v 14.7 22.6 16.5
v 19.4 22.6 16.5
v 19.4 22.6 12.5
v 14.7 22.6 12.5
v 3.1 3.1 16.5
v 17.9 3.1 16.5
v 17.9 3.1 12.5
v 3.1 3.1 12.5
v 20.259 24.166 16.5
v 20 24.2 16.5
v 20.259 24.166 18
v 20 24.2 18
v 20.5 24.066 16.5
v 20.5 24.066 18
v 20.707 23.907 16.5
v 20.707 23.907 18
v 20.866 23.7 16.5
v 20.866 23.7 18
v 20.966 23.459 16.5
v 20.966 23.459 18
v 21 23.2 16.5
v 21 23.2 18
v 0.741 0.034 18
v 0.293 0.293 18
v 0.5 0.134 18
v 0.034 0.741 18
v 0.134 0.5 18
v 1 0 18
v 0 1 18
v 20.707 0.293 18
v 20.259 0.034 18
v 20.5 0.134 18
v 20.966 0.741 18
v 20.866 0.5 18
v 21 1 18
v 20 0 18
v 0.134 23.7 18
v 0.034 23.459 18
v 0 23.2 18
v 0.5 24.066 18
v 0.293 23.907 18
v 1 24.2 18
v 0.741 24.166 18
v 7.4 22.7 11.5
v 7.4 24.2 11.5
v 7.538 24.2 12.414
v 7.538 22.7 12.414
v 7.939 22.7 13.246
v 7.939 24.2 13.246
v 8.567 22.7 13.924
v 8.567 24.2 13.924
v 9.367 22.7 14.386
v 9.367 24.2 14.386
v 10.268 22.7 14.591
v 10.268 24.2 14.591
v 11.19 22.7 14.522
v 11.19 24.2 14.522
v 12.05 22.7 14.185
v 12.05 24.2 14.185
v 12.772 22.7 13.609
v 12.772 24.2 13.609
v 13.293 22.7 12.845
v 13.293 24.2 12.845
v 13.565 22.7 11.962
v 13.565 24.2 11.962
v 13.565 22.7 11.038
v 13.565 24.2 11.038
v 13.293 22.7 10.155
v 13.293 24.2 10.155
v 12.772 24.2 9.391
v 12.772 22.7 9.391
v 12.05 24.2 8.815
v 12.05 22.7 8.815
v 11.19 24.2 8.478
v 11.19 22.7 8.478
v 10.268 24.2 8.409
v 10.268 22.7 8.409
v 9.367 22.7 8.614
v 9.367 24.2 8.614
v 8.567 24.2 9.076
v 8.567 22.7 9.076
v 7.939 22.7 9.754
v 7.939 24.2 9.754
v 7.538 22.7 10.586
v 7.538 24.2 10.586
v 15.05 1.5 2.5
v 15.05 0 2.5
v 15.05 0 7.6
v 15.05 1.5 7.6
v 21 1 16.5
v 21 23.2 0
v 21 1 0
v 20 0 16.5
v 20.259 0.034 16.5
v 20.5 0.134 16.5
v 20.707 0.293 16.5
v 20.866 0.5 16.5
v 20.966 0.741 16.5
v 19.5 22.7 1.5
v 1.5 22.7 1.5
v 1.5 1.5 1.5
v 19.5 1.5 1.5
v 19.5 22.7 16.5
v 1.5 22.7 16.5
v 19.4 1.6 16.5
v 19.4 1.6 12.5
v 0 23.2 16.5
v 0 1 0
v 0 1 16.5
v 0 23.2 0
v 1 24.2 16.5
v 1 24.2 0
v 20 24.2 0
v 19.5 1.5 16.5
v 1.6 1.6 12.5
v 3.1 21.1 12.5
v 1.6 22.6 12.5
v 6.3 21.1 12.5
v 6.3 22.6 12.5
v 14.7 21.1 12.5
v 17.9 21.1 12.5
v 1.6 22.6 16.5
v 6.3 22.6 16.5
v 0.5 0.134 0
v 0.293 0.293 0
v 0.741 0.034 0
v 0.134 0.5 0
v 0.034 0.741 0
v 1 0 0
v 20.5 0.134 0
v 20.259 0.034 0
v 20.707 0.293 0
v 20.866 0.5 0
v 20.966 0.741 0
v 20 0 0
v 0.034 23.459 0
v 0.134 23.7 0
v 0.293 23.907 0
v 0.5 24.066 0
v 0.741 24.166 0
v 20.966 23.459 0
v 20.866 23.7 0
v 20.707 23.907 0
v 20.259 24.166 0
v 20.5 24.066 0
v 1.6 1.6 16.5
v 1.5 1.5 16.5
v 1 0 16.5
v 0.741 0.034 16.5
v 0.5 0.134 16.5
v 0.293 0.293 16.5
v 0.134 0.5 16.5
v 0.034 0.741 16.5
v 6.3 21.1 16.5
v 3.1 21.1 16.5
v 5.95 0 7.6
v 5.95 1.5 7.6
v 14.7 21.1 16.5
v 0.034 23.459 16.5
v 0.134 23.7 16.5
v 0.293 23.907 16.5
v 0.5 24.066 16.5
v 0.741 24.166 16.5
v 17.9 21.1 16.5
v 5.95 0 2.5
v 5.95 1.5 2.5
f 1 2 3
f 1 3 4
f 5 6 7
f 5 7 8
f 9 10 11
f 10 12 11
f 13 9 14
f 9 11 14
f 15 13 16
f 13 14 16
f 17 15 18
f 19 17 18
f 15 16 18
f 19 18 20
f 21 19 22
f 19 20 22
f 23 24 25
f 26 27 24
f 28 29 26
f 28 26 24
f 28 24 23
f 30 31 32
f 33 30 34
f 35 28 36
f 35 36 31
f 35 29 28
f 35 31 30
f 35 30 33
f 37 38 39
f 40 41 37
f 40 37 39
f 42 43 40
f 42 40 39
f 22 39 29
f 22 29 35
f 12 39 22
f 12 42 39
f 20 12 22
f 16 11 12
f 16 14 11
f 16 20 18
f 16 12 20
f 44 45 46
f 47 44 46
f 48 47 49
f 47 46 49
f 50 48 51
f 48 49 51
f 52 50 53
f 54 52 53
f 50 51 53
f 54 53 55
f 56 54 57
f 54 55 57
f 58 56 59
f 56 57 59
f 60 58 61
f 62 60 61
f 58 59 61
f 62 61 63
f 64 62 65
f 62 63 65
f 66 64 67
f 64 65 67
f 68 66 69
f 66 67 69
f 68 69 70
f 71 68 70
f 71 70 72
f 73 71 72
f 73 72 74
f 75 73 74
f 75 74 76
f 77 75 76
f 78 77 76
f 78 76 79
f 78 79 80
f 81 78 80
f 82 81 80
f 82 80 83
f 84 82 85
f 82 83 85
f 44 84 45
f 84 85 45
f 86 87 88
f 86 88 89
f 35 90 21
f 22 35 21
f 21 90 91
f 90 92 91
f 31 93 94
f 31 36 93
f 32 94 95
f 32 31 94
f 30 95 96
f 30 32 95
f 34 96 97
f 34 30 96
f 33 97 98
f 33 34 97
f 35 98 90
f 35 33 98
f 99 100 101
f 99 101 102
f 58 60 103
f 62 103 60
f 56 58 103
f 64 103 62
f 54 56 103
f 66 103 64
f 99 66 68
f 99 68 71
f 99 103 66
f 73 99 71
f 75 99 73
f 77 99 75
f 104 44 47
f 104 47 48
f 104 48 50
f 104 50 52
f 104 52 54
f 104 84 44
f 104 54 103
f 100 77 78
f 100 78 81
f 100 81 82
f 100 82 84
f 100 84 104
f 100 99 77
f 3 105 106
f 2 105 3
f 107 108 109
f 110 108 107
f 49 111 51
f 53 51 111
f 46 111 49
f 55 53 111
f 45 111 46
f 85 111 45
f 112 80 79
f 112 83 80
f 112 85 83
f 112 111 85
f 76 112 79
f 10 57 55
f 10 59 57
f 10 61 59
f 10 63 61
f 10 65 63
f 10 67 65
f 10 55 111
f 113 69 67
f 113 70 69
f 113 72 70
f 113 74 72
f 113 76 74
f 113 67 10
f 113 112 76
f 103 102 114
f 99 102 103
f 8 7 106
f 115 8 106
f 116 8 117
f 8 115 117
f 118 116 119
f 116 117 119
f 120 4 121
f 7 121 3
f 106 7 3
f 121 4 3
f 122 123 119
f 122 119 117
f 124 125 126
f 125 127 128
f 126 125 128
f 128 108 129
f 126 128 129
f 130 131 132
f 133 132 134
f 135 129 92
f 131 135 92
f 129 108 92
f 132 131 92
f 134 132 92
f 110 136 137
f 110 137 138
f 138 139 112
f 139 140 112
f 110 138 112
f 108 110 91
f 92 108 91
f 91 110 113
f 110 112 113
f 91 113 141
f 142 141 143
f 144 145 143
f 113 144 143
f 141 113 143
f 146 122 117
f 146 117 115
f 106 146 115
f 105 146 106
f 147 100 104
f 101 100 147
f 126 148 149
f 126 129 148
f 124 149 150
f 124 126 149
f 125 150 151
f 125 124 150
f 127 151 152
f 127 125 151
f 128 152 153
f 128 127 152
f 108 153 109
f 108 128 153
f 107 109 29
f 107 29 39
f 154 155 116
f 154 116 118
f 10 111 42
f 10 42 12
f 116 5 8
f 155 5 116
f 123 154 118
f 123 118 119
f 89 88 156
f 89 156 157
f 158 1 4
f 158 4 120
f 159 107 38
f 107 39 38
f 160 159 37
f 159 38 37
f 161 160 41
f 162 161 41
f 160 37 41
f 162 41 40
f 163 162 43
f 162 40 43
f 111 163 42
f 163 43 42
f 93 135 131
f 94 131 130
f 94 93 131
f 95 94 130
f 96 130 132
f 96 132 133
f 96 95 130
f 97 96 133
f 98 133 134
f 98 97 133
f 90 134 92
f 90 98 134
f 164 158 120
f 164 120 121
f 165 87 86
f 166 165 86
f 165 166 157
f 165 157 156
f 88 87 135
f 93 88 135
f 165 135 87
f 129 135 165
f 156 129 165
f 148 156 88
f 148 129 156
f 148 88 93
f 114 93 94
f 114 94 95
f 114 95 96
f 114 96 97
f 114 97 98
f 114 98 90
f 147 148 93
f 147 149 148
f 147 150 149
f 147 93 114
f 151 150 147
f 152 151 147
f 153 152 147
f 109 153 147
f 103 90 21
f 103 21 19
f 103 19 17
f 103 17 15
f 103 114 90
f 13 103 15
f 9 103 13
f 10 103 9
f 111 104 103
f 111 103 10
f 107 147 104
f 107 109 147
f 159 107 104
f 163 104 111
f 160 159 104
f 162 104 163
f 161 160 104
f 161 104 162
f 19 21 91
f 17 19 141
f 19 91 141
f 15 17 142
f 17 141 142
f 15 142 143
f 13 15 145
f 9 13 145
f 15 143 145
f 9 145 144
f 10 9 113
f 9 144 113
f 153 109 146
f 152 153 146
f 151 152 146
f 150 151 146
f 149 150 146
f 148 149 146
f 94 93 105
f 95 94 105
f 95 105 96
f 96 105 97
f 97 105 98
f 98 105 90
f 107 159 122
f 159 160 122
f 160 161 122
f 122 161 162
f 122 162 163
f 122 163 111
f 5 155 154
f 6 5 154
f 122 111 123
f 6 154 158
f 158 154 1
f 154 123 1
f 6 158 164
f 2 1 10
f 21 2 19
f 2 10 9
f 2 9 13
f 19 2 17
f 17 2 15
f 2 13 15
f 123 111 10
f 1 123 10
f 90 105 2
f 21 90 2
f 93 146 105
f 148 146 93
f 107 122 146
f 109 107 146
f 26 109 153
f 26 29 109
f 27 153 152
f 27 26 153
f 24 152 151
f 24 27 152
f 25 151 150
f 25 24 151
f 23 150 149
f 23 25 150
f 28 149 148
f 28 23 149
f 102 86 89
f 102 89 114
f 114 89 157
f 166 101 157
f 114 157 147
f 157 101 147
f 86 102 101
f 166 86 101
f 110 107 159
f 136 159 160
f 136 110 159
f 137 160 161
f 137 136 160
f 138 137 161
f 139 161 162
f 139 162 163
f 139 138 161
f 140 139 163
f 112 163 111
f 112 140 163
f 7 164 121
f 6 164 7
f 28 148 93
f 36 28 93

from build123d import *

# Parameters (mm, degrees)
SKETCH_W      = 21
SKETCH_H      = 24.2
PAD_DEPTH     = 1.5
PAD001_DEPTH  = 15
SKETCH002_W   = 1.5
SKETCH002_H   = 8.9
SKETCH002_H_2 = 1
PAD002_DEPTH  = 9.1
SKETCH006_R   = 3.1
POCKET_DEPTH  = 1.5
FILLET_R      = 1
PAD003_DEPTH  = 4
SKETCH005_W   = 21
SKETCH005_H   = 24.2
PAD004_DEPTH  = 1.5
FILLET001_R   = 1


with BuildPart() as case_bottom:
    # Sketch → Pad (new body)
    with BuildSketch(Plane.XY):
        with Locations((10.5, 12.1)):
            Rectangle(SKETCH_W, SKETCH_H)
    extrude(amount=PAD_DEPTH)

    # Sketch001 (on Face6 of Pad) → Pad001 (join)
    with BuildSketch(Plane.XY.offset(1.5)):
        Polygon((5.95, 0), (0, 0), (0, 24.2), (21, 24.2), (21, 0), (15.05, 0), (15.05, 1.5), (19.5, 1.5), (19.5, 22.7), (1.5, 22.7), (1.5, 1.5), (5.95, 1.5), align=None)
    extrude(amount=PAD001_DEPTH)

    # Sketch002 (on Face4 of Pad001) → Pad002 (join)
    with BuildSketch(Plane.YZ.offset(5.95)):
        with Locations((0.75, 12.05)):
            Rectangle(SKETCH002_W, SKETCH002_H)
        with Locations((0.75, 2)):
            Rectangle(SKETCH002_W, SKETCH002_H_2)
    extrude(amount=PAD002_DEPTH)

    # Sketch006 (on Face3 of Pad002) → Pocket (cut)
    with BuildSketch(Plane(origin=(0, 24.2, 0), x_dir=(-1, 0, 0), z_dir=(0, 1, 0))):
        with Locations((-10.5, 11.5)):
            Circle(SKETCH006_R)
    extrude(amount=-POCKET_DEPTH, mode=Mode.SUBTRACT)

    # Fillet
    fillet_edges = [case_bottom.edges().sort_by_distance(p)[0] for p in [
        (21, 24.2, 8.25),
        (0, 24.2, 8.25),
        (0, 0, 8.25),
        (21, 0, 8.25),
    ]]
    fillet(fillet_edges, radius=FILLET_R)


with BuildPart() as cover:
    # Sketch004 → Pad003 (new body)
    with BuildSketch(Plane.XY.offset(16.5)):
        Polygon((6.3, 22.6), (1.6, 22.6), (1.6, 1.6), (19.4, 1.6), (19.4, 22.6), (14.7, 22.6), (14.7, 21.1), (17.9, 21.1), (17.9, 3.1), (3.1, 3.1), (3.1, 21.1), (6.3, 21.1), align=None)
    extrude(amount=-PAD003_DEPTH)

    # Sketch005 (on Face13 of Pad003) → Pad004 (join)
    with BuildSketch(Plane.XY.offset(16.5)):
        with Locations((10.5, 12.1)):
            Rectangle(SKETCH005_W, SKETCH005_H)
    extrude(amount=PAD004_DEPTH)

    # Fillet001
    fillet001_edges = [cover.edges().sort_by_distance(p)[0] for p in [
        (0, 0, 17.25),
        (21, 0, 17.25),
        (0, 24.2, 17.25),
        (21, 24.2, 17.25),
    ]]
    fillet(fillet001_edges, radius=FILLET001_R)


solid = Compound([case_bottom.part, cover.part])
